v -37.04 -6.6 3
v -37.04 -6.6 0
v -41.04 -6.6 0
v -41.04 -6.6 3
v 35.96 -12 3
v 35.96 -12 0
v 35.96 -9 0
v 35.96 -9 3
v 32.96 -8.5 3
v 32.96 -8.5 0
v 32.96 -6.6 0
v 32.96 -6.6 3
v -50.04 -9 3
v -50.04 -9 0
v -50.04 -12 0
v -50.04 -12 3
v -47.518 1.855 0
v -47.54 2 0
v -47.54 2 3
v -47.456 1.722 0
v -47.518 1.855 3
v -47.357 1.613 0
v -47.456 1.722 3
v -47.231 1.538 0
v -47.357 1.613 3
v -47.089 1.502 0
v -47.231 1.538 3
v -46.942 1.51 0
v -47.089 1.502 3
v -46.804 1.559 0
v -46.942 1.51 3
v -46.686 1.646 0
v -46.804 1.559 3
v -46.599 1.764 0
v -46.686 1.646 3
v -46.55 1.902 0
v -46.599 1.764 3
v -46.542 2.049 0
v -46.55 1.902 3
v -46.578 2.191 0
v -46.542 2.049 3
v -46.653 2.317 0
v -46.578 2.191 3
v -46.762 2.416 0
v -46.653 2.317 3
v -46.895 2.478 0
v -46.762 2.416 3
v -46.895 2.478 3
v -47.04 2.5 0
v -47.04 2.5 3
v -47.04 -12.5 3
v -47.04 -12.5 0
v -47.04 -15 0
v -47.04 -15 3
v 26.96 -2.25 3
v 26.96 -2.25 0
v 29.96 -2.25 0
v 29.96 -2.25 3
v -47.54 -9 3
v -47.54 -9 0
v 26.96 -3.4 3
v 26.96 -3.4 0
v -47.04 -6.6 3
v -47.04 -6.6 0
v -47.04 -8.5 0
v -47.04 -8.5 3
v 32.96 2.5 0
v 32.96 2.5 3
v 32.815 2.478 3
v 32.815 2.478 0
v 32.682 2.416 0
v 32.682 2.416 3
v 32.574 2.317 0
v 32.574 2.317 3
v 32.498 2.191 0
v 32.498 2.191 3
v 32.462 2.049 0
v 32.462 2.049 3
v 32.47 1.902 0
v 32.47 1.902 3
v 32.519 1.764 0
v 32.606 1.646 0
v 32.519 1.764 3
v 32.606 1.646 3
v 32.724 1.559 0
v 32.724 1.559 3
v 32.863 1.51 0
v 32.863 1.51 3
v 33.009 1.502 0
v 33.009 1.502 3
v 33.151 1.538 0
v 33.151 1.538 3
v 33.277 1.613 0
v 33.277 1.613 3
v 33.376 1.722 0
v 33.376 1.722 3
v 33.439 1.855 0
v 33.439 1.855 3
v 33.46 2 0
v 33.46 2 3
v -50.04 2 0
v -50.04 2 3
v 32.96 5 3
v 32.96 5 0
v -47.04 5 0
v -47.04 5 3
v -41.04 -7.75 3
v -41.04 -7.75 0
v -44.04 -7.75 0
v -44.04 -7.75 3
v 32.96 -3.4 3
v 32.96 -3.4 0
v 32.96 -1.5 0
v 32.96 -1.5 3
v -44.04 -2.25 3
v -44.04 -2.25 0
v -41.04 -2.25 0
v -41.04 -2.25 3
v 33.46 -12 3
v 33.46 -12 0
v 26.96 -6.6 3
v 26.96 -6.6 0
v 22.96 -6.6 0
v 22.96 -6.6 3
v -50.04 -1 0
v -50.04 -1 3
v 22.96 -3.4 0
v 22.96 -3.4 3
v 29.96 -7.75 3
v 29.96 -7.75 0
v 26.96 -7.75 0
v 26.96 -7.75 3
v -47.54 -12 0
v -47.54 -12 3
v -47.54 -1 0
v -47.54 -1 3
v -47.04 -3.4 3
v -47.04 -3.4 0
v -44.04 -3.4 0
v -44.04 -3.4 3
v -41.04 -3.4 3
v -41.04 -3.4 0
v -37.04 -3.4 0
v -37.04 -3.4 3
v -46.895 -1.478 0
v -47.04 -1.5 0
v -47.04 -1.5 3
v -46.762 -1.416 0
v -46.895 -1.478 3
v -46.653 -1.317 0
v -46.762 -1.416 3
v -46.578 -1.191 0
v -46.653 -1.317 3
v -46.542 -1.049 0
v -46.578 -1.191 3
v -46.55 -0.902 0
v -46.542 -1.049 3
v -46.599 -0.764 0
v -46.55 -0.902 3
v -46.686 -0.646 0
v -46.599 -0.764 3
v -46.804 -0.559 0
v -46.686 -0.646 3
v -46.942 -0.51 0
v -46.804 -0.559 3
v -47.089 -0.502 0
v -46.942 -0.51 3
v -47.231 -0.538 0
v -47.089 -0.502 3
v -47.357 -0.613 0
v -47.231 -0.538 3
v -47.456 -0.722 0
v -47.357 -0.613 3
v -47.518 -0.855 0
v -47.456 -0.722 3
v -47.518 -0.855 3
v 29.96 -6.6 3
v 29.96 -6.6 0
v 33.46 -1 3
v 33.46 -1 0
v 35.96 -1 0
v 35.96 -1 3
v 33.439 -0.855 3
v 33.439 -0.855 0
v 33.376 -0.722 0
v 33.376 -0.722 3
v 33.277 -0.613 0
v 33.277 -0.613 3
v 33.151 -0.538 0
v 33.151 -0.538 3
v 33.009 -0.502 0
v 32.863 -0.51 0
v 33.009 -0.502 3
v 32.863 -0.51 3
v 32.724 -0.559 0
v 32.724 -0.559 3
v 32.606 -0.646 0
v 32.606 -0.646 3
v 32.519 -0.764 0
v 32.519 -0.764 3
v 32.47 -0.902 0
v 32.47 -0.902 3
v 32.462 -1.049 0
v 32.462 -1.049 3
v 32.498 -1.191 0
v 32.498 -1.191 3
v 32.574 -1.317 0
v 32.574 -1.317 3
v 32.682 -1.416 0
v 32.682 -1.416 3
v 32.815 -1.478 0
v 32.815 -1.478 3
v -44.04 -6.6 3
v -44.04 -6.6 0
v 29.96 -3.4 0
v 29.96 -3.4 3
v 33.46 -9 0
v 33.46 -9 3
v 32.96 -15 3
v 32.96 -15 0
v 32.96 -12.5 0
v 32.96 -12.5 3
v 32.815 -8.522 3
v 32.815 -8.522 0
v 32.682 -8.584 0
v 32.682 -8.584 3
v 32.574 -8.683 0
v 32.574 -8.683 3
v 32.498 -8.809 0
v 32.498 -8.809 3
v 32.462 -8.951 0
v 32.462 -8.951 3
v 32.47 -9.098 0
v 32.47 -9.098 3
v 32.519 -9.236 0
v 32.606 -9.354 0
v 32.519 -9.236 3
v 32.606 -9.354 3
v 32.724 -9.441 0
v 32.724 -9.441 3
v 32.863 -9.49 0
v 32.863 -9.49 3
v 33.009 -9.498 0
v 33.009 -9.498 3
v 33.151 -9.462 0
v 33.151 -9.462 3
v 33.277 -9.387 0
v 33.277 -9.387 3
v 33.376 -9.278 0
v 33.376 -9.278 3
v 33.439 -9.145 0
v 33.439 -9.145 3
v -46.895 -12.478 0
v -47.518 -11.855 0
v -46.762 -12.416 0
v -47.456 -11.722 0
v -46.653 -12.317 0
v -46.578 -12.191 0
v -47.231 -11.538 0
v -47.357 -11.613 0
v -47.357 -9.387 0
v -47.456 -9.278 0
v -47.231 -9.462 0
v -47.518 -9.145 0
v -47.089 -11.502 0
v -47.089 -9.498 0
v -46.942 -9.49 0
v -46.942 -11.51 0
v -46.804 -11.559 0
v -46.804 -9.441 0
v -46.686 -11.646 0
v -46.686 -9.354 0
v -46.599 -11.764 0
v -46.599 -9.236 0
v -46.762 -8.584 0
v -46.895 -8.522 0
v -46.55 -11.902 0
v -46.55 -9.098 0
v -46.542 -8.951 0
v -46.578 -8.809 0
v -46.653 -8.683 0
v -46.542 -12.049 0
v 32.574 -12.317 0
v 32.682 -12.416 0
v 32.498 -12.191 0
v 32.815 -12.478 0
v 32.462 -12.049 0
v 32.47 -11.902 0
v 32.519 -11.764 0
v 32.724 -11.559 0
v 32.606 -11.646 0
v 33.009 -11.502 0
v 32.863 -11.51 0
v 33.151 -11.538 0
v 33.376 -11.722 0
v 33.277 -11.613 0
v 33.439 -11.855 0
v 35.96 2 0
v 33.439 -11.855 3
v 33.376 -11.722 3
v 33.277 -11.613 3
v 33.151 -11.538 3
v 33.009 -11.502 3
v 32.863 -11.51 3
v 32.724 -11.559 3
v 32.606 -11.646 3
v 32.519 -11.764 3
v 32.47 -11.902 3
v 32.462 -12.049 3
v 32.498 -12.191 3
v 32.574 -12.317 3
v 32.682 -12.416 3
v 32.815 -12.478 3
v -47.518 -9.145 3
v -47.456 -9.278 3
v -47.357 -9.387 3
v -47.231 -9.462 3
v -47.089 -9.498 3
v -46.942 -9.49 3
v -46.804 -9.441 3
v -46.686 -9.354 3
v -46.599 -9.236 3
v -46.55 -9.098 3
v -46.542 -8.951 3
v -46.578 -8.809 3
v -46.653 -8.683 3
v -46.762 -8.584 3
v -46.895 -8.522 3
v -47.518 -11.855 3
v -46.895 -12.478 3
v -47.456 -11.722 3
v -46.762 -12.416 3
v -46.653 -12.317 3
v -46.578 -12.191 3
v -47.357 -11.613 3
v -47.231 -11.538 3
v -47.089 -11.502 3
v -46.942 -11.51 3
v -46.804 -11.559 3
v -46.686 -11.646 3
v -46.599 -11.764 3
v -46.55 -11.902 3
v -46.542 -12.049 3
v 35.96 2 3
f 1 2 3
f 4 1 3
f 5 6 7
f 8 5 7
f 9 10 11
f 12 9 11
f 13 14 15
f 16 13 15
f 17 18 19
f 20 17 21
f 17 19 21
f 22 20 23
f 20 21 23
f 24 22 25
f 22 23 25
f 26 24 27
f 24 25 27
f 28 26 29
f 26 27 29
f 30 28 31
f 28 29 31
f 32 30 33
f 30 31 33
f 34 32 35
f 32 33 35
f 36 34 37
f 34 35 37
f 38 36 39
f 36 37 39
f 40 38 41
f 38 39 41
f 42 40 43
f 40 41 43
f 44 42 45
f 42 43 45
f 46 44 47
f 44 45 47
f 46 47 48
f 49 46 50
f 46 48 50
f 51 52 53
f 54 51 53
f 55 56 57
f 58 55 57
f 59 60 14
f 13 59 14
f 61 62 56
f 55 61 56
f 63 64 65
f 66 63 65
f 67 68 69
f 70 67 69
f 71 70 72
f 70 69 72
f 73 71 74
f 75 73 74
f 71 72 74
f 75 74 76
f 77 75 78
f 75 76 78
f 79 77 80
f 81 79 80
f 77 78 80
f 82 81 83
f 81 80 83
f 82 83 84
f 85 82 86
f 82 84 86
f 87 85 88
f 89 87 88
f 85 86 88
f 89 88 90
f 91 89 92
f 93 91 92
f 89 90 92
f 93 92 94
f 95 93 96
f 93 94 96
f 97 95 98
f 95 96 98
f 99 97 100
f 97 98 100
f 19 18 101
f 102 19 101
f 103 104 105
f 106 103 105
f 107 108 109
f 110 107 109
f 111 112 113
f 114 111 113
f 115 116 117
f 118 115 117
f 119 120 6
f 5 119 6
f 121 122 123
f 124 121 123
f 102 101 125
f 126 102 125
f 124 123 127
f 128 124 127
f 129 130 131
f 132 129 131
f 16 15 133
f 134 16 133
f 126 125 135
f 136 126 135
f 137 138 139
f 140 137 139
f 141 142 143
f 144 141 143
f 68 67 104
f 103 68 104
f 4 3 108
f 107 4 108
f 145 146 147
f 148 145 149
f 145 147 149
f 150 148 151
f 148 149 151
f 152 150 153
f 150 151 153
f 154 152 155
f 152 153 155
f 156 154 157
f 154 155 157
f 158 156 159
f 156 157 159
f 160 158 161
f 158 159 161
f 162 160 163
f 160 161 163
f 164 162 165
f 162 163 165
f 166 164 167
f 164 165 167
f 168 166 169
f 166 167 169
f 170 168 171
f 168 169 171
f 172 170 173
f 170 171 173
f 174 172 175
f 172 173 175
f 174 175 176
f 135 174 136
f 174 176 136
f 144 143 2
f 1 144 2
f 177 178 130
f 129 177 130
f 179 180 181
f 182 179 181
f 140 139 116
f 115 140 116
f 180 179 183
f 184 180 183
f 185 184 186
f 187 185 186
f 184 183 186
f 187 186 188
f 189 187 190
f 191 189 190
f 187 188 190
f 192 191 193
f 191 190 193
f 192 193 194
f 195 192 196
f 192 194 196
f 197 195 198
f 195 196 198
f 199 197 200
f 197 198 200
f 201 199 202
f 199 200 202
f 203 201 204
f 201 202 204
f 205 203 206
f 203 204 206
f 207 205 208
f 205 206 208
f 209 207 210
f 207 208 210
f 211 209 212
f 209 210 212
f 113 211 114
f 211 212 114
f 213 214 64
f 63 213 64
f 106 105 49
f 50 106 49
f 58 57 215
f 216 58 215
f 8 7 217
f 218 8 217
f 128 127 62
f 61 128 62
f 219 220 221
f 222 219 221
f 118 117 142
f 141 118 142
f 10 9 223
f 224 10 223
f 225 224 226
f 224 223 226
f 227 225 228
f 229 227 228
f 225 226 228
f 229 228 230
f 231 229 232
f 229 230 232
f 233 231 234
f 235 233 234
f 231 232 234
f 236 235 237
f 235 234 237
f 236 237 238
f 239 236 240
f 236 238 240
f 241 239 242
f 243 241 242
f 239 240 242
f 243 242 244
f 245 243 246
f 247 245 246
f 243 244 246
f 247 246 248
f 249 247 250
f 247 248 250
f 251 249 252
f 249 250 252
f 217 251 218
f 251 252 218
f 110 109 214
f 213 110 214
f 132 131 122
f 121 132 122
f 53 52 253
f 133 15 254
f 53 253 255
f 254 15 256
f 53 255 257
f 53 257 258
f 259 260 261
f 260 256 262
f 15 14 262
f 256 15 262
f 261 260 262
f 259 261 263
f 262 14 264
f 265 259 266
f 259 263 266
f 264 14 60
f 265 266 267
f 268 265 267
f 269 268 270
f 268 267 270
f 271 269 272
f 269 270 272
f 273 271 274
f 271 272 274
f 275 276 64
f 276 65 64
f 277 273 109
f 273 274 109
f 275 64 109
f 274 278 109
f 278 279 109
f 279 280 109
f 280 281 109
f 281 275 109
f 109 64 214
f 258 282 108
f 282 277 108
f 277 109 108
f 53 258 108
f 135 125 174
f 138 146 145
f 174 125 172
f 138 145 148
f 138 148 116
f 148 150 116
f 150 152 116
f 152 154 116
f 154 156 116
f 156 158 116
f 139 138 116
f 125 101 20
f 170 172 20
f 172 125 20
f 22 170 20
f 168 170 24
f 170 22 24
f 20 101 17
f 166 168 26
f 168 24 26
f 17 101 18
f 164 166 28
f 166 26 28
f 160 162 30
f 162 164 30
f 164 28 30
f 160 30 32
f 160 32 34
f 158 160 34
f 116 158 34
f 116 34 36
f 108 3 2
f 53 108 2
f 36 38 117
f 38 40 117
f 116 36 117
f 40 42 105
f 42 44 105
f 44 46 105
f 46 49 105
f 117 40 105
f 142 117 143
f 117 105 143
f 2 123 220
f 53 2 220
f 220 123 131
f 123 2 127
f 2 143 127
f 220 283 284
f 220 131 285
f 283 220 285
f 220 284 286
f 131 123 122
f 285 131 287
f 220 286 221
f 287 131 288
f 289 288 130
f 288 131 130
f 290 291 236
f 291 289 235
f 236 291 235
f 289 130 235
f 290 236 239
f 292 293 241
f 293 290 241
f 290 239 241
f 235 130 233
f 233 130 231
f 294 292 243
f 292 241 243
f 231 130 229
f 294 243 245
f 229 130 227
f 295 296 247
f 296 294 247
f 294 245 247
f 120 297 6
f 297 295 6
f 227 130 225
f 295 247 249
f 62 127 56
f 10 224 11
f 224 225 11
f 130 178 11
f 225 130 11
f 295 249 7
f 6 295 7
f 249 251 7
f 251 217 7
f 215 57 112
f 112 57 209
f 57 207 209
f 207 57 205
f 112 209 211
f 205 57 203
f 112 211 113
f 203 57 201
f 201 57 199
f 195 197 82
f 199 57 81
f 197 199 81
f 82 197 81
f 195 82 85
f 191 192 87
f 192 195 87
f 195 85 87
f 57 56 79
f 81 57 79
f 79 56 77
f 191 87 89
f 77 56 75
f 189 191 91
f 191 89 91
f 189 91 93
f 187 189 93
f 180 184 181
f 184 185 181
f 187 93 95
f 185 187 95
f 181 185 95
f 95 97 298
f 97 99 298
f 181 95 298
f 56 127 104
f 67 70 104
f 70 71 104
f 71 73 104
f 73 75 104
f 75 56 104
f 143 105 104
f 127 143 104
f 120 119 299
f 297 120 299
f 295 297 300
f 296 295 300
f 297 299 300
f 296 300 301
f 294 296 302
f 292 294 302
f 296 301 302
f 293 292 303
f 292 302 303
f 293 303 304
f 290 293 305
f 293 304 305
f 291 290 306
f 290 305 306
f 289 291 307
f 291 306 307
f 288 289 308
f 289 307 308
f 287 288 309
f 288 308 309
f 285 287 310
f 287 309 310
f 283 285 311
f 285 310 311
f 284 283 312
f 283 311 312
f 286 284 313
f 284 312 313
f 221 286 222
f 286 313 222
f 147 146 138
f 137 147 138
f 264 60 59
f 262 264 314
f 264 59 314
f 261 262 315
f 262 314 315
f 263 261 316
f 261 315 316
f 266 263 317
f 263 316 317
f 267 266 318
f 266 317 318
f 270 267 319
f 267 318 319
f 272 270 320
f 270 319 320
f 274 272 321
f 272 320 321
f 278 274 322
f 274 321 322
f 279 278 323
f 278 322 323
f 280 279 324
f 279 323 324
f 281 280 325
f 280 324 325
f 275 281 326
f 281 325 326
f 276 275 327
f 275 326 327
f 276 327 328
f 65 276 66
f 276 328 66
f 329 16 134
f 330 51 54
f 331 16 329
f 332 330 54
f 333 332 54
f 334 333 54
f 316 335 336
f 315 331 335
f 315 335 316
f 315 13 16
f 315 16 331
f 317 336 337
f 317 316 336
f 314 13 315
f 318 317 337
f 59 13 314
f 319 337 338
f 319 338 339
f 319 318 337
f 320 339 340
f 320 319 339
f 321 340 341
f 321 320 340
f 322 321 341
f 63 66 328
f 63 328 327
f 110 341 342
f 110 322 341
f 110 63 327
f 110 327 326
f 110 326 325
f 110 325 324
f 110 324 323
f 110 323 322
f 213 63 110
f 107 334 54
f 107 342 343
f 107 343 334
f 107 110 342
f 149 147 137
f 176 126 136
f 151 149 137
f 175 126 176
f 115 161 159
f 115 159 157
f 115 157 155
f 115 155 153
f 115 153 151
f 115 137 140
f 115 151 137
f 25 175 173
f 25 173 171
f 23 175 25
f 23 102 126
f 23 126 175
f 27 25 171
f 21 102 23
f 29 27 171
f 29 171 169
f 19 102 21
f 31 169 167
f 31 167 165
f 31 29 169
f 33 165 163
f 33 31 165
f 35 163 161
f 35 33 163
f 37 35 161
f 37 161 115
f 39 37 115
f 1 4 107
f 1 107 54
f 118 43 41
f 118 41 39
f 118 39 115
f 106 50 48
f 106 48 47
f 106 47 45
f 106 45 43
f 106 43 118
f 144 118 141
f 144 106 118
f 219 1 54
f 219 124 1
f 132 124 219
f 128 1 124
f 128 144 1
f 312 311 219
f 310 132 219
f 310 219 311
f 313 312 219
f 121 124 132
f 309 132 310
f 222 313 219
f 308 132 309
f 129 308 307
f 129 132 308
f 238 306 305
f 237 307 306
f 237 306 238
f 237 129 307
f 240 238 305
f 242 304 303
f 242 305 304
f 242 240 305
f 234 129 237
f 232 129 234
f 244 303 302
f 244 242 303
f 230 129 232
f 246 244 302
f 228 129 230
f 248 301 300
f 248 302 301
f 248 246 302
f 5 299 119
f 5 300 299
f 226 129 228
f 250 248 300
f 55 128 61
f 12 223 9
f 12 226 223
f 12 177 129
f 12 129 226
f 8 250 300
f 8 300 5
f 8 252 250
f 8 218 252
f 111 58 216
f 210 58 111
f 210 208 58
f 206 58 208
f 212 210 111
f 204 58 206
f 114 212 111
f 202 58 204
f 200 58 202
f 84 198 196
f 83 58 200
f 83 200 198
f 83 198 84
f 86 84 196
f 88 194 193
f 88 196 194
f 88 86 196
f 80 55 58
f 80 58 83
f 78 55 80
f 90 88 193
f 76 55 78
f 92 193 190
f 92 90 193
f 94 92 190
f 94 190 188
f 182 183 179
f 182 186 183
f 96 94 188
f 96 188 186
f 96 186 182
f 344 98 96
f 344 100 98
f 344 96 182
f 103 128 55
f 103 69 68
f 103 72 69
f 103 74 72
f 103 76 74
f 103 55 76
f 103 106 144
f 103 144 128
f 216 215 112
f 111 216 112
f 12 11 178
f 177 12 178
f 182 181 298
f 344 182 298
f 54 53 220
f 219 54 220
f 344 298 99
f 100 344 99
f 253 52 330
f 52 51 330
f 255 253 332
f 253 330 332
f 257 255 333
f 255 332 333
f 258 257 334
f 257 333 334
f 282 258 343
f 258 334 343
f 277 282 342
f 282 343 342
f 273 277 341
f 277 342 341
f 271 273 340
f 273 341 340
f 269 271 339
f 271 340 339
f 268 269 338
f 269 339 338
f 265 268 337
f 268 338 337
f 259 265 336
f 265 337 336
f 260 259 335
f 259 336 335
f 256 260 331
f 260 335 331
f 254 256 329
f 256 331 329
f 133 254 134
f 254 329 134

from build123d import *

# Parameters (mm, degrees)
BOSS_EXTRUDE1_DEPTH = 3
SKETCH2_R           = 0.5
CUT_EXTRUDE1_DEPTH  = 4


with BuildPart() as part:
    # Sketch1 → Boss-Extrude1 (new body)
    with BuildSketch(Plane.XY):
        Polygon((-47.039949999, -12), (-47.039949999, -15), (32.960050001, -15), (32.960050001, -12), (35.960050001, -12), (35.960050001, -9), (32.960050001, -9), (32.960050001, -6.6), (29.960050001, -6.6), (29.960050001, -7.75), (26.960050001, -7.75), (26.960050001, -6.6), (22.960050001, -6.6), (22.960050001, -3.4), (26.960050001, -3.4), (26.960050001, -2.25), (29.960050001, -2.25), (29.960050001, -3.4), (32.960050001, -3.4), (32.960050001, -1), (35.960050001, -1), (35.960050001, 2), (32.960050001, 2), (32.960050001, 5), (-47.039949999, 5), (-47.039949999, 2), (-50.039949999, 2), (-50.039949999, -1), (-47.039949999, -1), (-47.039949999, -3.4), (-44.039949999, -3.4), (-44.039949999, -2.25), (-41.039949999, -2.25), (-41.039949999, -3.4), (-37.039949999, -3.4), (-37.039949999, -6.6), (-41.039949999, -6.6), (-41.039949999, -7.75), (-44.039949999, -7.75), (-44.039949999, -6.6), (-47.039949999, -6.6), (-47.039949999, -9), (-50.039949999, -9), (-50.039949999, -12), align=None)
    extrude(amount=BOSS_EXTRUDE1_DEPTH)

    # Sketch2 → Cut-Extrude1 (cut, through all)
    with BuildSketch(Plane.XY.offset(3)):
        with Locations((-47.039949999, 2)):
            Circle(SKETCH2_R)
        with Locations((-47.039949999, -1)):
            Circle(SKETCH2_R)
        with Locations((-47.039949999, -12)):
            Circle(SKETCH2_R)
        with Locations((-47.039949999, -9)):
            Circle(SKETCH2_R)
        with Locations((32.960050001, 2)):
            Circle(SKETCH2_R)
        with Locations((32.960050001, -1)):
            Circle(SKETCH2_R)
        with Locations((32.960050001, -9)):
            Circle(SKETCH2_R)
        with Locations((32.960050001, -12)):
            Circle(SKETCH2_R)
    extrude(amount=-CUT_EXTRUDE1_DEPTH, mode=Mode.SUBTRACT)


solid = part.part
